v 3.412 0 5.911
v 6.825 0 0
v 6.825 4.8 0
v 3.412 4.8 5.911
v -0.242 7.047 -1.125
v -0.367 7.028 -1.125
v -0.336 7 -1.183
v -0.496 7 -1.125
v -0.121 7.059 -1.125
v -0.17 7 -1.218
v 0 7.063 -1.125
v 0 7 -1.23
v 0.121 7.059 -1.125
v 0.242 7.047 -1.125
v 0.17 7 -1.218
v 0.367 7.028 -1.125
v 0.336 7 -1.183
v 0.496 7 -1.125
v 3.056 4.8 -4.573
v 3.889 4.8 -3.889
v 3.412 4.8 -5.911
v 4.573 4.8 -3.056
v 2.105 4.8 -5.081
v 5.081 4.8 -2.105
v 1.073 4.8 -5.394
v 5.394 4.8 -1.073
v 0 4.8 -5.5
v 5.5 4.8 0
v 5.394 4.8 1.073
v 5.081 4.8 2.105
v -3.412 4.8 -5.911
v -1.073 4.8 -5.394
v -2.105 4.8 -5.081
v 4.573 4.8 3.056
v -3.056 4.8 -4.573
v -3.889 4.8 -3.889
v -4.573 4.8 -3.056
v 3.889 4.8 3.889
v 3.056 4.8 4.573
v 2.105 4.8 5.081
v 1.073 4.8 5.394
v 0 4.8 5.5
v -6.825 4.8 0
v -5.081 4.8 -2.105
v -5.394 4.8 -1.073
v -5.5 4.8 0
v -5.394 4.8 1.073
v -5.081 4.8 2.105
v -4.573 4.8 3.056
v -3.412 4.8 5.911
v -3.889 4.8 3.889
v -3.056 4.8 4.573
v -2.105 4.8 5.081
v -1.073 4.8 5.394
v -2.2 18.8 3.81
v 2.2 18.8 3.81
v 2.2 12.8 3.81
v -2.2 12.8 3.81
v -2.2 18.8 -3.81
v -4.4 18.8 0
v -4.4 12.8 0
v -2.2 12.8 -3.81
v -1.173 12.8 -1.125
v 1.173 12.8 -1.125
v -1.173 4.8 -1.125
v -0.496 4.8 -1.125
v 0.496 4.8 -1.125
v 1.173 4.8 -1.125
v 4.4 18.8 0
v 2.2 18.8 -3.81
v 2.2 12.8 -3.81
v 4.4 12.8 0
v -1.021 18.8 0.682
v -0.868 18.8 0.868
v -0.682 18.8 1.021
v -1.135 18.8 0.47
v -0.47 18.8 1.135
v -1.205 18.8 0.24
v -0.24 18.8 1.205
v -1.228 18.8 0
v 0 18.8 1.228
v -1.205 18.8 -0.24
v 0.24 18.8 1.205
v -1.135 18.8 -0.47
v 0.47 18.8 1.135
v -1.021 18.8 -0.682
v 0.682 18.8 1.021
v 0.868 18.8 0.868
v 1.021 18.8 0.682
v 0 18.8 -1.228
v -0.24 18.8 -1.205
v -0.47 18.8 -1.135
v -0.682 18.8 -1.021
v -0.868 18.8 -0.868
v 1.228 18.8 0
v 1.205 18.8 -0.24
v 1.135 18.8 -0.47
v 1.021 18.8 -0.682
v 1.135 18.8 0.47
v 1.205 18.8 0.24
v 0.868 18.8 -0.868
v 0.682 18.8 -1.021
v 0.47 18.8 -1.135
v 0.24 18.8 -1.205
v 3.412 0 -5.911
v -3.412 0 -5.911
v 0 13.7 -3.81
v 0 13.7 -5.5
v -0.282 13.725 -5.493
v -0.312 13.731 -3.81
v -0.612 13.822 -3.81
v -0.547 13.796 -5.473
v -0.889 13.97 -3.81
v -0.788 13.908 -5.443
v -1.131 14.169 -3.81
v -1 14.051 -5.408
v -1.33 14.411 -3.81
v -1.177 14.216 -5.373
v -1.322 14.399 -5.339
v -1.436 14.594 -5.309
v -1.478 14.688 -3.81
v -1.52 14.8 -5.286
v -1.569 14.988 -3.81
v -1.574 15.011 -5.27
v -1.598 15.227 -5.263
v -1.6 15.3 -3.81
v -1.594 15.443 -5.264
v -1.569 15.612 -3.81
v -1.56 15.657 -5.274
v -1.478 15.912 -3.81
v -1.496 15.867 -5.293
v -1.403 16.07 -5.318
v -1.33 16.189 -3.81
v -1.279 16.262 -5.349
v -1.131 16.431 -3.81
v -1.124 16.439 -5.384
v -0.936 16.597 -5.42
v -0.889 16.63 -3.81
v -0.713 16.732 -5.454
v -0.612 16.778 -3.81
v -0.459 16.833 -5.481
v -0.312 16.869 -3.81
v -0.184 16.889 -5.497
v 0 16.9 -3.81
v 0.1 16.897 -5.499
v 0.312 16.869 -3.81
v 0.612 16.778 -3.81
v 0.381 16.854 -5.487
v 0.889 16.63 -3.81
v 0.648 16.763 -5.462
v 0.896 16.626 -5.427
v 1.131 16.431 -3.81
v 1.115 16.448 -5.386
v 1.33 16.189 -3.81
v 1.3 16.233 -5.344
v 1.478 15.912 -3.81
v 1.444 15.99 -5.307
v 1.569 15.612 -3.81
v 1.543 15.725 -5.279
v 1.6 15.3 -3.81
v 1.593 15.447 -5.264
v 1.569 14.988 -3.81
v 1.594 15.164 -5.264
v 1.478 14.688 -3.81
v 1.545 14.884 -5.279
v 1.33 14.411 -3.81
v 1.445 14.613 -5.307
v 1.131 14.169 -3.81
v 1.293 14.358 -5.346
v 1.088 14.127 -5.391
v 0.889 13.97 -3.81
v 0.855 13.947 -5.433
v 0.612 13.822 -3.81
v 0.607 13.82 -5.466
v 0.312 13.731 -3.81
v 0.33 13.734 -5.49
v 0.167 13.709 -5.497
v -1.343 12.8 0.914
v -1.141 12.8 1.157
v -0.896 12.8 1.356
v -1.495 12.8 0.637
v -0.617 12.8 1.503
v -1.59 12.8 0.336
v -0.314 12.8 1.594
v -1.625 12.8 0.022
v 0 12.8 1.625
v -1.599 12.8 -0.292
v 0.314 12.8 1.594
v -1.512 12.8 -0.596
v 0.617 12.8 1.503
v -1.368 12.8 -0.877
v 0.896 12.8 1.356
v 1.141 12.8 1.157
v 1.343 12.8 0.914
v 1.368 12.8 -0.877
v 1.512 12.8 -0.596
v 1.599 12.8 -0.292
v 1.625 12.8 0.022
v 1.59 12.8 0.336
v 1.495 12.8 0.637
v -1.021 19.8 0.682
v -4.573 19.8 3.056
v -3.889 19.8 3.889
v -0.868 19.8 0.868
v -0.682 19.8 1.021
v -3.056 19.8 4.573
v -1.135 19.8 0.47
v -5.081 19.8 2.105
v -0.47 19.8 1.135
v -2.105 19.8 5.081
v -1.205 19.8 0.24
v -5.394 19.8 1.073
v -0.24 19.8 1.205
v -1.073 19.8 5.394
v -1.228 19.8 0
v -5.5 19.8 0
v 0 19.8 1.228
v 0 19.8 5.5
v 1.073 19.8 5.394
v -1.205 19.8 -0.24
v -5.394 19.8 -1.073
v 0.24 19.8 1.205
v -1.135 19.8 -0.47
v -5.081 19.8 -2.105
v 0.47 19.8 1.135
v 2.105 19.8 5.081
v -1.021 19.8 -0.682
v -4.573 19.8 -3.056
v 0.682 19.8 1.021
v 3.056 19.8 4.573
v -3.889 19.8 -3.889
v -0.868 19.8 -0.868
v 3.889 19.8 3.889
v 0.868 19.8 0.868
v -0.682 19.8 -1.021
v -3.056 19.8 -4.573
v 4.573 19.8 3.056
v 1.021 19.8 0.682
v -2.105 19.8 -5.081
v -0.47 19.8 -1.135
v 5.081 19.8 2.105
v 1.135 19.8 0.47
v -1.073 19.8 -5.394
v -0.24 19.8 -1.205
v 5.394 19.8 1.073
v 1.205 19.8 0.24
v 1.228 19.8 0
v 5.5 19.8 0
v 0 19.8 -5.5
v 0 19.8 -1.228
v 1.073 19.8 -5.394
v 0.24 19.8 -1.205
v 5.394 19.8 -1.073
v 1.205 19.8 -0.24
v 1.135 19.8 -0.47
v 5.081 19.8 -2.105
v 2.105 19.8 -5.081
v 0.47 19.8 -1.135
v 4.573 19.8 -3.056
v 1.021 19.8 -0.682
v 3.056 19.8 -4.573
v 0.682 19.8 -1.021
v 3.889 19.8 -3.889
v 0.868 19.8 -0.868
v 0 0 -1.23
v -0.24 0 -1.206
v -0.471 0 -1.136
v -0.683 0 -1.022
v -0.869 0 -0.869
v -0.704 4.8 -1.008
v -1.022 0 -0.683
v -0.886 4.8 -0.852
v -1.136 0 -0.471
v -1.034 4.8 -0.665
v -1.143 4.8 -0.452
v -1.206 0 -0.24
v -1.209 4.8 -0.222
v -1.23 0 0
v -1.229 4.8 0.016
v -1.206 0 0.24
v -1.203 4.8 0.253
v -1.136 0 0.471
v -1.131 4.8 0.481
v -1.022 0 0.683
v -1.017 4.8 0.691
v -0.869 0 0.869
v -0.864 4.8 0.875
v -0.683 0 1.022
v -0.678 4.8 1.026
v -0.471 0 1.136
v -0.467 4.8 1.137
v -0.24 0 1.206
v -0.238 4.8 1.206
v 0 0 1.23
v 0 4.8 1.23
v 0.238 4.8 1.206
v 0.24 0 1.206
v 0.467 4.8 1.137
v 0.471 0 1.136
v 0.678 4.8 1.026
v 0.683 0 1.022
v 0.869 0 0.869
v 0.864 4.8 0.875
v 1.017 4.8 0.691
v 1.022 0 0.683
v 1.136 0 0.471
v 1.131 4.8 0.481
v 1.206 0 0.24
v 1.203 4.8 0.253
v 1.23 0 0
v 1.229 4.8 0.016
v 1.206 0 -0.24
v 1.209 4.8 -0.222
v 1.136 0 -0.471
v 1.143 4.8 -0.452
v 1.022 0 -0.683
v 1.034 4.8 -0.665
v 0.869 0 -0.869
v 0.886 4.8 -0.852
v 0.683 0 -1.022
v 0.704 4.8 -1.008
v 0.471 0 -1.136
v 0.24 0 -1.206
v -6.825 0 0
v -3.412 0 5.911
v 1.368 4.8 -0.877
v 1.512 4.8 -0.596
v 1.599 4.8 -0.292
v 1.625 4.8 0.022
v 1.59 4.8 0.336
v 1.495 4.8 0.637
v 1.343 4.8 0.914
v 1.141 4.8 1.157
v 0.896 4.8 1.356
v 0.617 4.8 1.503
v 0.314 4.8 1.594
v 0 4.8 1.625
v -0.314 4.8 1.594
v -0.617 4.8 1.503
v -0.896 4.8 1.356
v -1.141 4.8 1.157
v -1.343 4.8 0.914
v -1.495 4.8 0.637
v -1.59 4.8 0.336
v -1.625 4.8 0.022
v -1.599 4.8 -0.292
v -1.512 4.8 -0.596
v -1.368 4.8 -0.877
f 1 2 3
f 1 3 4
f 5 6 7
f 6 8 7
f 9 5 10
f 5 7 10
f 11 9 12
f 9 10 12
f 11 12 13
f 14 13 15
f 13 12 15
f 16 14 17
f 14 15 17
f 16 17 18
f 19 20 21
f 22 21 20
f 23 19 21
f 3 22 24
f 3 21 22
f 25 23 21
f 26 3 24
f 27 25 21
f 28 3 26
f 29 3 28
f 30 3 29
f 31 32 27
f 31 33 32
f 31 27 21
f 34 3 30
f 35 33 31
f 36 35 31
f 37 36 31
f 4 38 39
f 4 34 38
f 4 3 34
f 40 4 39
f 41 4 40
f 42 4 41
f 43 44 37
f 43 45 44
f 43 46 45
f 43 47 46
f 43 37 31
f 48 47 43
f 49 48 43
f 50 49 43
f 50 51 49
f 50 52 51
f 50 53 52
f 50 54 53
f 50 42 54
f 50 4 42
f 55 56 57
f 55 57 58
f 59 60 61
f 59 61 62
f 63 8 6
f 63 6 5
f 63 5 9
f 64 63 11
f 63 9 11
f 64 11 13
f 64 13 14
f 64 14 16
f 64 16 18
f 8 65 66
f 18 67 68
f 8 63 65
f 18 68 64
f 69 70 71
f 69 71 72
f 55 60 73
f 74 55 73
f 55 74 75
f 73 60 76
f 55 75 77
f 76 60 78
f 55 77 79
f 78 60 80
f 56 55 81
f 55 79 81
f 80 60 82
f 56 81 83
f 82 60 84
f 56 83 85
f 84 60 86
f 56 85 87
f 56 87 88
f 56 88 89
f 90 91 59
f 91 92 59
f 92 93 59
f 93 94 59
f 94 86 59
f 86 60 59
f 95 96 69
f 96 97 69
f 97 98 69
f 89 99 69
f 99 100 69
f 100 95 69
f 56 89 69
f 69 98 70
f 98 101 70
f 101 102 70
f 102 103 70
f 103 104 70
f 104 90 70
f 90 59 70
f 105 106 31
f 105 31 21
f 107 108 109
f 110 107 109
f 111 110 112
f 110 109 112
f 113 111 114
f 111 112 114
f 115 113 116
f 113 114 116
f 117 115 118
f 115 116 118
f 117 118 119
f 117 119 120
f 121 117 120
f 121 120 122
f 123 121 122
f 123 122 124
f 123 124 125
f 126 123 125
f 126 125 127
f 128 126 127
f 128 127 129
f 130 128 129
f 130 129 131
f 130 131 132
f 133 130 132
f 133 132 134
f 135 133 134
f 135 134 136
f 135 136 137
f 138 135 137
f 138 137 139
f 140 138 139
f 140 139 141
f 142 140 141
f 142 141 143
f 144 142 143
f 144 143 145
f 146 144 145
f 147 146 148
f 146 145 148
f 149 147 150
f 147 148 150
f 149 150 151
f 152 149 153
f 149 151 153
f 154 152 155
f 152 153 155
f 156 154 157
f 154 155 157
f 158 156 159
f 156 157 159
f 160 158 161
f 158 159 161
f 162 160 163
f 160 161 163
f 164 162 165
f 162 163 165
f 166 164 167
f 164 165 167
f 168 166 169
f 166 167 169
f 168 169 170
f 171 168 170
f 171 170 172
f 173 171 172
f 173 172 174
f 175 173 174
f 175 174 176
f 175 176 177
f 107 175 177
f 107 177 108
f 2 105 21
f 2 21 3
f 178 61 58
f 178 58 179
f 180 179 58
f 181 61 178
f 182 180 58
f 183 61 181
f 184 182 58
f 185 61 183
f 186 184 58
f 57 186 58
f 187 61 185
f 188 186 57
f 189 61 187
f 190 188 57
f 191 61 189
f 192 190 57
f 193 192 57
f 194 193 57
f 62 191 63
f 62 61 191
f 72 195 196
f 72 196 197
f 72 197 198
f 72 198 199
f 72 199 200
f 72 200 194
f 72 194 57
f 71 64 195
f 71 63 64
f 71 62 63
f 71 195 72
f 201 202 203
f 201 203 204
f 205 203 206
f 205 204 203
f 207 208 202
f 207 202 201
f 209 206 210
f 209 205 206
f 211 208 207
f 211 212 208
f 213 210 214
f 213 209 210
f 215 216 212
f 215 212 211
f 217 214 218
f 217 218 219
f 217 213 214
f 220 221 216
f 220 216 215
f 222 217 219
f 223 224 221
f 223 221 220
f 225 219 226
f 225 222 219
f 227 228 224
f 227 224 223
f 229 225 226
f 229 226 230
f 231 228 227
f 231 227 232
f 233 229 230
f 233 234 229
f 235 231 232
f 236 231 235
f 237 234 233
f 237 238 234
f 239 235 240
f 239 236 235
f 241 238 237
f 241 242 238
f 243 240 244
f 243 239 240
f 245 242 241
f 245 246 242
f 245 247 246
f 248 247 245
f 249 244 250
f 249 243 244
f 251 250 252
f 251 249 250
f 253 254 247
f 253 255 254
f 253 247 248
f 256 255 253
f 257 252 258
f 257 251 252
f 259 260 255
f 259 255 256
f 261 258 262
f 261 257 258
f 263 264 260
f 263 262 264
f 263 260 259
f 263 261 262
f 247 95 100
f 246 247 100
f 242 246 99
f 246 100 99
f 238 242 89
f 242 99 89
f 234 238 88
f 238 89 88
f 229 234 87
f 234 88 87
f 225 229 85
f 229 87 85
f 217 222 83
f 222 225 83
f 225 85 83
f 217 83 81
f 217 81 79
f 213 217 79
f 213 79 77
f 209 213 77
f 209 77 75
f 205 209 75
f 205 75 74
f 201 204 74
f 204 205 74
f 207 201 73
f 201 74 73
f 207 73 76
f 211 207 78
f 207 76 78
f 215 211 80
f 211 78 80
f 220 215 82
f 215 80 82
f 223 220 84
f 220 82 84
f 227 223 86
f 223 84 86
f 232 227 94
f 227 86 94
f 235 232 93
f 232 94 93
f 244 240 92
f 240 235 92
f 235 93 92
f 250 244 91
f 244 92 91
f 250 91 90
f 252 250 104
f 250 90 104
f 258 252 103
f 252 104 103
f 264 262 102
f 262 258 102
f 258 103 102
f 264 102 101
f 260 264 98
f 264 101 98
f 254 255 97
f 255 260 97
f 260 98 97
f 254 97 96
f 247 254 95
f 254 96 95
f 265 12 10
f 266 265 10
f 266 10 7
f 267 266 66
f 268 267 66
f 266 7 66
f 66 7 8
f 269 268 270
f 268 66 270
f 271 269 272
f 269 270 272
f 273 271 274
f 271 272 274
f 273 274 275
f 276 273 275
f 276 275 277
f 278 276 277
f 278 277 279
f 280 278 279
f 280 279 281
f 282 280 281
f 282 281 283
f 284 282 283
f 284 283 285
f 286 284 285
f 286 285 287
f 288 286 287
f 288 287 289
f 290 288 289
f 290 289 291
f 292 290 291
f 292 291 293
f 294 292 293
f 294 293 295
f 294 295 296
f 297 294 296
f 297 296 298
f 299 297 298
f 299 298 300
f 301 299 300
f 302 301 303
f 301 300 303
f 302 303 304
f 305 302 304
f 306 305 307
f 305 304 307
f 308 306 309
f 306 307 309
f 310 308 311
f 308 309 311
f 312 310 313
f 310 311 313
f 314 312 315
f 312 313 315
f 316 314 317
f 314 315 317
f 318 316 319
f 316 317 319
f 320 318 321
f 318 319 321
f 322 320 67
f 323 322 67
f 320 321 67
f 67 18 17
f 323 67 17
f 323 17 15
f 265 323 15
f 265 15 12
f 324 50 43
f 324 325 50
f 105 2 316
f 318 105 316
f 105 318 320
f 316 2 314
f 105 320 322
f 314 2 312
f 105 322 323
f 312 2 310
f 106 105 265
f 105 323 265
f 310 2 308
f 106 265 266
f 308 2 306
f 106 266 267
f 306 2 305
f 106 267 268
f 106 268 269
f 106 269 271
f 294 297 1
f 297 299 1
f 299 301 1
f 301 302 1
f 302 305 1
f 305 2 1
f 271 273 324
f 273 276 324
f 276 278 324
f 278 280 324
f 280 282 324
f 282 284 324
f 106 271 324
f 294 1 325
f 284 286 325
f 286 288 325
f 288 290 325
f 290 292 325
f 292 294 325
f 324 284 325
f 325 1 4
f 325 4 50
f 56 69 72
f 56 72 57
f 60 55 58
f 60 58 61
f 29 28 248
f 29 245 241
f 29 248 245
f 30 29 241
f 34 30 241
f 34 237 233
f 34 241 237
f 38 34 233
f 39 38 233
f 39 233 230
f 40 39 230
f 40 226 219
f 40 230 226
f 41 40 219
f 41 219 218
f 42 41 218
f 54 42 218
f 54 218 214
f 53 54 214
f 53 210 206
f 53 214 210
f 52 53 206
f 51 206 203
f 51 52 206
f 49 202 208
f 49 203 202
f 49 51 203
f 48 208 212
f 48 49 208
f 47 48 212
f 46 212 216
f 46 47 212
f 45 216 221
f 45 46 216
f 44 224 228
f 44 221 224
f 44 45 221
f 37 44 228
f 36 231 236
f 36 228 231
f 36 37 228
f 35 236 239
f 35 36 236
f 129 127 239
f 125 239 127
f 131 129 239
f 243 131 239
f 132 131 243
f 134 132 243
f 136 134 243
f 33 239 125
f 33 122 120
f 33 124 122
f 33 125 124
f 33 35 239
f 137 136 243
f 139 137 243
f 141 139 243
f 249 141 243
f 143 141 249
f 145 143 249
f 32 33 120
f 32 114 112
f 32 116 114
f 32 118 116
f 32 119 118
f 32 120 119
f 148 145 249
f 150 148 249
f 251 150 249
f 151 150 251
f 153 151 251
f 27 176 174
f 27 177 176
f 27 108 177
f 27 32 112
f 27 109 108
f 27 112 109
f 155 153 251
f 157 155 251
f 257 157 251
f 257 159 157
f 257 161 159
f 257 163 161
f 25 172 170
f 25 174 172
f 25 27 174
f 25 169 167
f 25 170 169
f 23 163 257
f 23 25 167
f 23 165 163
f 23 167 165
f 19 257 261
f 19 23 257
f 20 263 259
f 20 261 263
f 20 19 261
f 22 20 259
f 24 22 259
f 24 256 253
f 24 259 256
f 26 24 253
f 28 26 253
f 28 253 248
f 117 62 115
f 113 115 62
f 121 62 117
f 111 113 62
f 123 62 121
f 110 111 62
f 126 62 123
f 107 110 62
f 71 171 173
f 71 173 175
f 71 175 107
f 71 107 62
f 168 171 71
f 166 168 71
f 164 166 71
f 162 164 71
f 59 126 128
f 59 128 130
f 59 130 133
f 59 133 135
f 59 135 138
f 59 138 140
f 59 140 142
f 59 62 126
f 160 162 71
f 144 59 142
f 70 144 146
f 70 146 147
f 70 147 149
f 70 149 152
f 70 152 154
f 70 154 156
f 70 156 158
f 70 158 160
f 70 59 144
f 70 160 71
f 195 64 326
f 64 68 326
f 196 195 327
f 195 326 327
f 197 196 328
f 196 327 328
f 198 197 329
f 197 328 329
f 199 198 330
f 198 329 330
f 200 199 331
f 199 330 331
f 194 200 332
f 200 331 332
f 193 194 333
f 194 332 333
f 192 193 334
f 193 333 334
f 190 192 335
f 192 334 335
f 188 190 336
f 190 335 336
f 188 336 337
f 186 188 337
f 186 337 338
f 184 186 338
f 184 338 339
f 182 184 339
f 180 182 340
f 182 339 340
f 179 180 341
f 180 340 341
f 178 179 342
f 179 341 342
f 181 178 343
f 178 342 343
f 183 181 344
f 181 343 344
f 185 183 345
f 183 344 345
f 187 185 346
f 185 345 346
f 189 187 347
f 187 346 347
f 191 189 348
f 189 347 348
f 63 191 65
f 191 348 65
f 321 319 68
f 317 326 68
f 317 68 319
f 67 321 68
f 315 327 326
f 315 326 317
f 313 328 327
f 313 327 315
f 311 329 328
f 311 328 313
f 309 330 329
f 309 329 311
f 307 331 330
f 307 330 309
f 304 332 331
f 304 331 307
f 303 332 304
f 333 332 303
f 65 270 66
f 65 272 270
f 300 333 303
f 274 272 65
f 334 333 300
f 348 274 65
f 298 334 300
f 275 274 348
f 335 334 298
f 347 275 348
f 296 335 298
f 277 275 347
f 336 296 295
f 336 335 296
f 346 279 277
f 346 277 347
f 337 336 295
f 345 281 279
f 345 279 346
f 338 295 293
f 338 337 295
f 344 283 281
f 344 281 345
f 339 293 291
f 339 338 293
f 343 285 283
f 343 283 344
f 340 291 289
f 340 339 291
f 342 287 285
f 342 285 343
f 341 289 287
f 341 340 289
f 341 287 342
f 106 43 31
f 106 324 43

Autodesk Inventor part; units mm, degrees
ref_plane "YZ Plane" through (0, 0, 0) normal (1, 0, 0) x (0, 1, 0)
ref_plane "XZ Plane" through (0, 0, 0) normal (0, 1, 0) x (-1, 0, 0)
ref_plane "XY Plane" through (0, 0, 0) normal (0, 0, 1) x (1, 0, 0)
sketch "Sketch1" plane through (0, 0, 0) normal (0, 1, 0) x (-1, 0, 0)
  line L0 (6.825, 0) -> (3.4125, -5.9106)
  line L1 (3.4125, -5.9106) -> (-3.4125, -5.9106)
  line L2 (-3.4125, -5.9106) -> (-6.825, 0)
  line L3 (-6.825, 0) -> (-3.4125, 5.9106)
  line L4 (-3.4125, 5.9106) -> (3.4125, 5.9106)
  line L5 (3.4125, 5.9106) -> (6.825, 0)
  point P0 (0, 0)
  point P1 (0, 0)
  dimension "d1" = 13.65
extrude "Extrusion1" add sketch "Sketch1" along normal blind 4.8
sketch "Sketch2" plane through (0, 4.8, 0) normal (0, 1, 0) x (1, 0, 0)
  circle A0 centre (0, 0) radius 5.5
  circle A1 centre (0, 0) radius 1.625
  line L0 (-1.1726, 1.125) -> (1.1726, 1.125)
  line L1 (0, -1.625) -> (0, 1.125)
  dimension "d4" = 11
  dimension "d5" = 3.25
  dimension "d56" = 2.75
extrude "Extrusion2" add sketch "Sketch2" along normal blind 14 contours A0 | L0 A1
sketch "Sketch7" plane through (-1.1726, 18.8, -1.125) normal (0, 0, 1) x (1, 0, 0)
  line L0 (0, 0) -> (2.3452, 0) projected
  line L1 (0, -14) -> (0, 0) projected
  line L2 (1.1726, 0) -> (1.1726, -3.5)
  circle A0 centre (1.1726, -3.5) radius 1
  point P0 (0, -0.5)
  point P1 (1.1726, -18.8)
  dimension "d33" = 3.5
  dimension "d34" = 2
hole "Hole1" at (0, 15.3, -1.125) direction (0, 0, -1) diameter 3.2 depth 8 tip angle 118
sketch "Sketch8" plane through (0, 0, 0) normal (0, -1, 0) x (1, 0, 0)
  circle A0 centre (0, 0) radius 1.5
  dimension "d42" = 3
hole "Hole2" at (0, 0, 0) direction (0, 1, 0) diameter 2.459 depth 7 tip angle 118
sketch "Sketch12" plane through (0, 18.8, 0) normal (0, 1, 0) x (1, 0, 0)
  line L0 (2.2, -3.8105) -> (-2.2, -3.8105)
  line L1 (-2.2, -3.8105) -> (-4.4, 0)
  line L2 (-4.4, 0) -> (-2.2, 3.8105)
  line L3 (-2.2, 3.8105) -> (2.2, 3.8105)
  line L4 (2.2, 3.8105) -> (4.4, 0)
  line L5 (4.4, 0) -> (2.2, -3.8105)
  line L6 (-1.1726, 1.125) -> (1.1726, 1.125) projected
  point P0 (0, 0)
  point P1 (0, 0)
  dimension "d64" = 4.4
  dimension "d69" = 7.621
extrude "Extrusion8" cut sketch "Sketch12" against normal blind 6
sketch "Sketch14" plane through (0, 18.8, 0) normal (0, 1, 0) x (1, 0, 0)
  circle A0 centre (0, 0) radius 5.5
  circle A1 centre (0, 0) radius 1.2282
extrude "Extrusion9" add sketch "Sketch14" along normal blind 1
